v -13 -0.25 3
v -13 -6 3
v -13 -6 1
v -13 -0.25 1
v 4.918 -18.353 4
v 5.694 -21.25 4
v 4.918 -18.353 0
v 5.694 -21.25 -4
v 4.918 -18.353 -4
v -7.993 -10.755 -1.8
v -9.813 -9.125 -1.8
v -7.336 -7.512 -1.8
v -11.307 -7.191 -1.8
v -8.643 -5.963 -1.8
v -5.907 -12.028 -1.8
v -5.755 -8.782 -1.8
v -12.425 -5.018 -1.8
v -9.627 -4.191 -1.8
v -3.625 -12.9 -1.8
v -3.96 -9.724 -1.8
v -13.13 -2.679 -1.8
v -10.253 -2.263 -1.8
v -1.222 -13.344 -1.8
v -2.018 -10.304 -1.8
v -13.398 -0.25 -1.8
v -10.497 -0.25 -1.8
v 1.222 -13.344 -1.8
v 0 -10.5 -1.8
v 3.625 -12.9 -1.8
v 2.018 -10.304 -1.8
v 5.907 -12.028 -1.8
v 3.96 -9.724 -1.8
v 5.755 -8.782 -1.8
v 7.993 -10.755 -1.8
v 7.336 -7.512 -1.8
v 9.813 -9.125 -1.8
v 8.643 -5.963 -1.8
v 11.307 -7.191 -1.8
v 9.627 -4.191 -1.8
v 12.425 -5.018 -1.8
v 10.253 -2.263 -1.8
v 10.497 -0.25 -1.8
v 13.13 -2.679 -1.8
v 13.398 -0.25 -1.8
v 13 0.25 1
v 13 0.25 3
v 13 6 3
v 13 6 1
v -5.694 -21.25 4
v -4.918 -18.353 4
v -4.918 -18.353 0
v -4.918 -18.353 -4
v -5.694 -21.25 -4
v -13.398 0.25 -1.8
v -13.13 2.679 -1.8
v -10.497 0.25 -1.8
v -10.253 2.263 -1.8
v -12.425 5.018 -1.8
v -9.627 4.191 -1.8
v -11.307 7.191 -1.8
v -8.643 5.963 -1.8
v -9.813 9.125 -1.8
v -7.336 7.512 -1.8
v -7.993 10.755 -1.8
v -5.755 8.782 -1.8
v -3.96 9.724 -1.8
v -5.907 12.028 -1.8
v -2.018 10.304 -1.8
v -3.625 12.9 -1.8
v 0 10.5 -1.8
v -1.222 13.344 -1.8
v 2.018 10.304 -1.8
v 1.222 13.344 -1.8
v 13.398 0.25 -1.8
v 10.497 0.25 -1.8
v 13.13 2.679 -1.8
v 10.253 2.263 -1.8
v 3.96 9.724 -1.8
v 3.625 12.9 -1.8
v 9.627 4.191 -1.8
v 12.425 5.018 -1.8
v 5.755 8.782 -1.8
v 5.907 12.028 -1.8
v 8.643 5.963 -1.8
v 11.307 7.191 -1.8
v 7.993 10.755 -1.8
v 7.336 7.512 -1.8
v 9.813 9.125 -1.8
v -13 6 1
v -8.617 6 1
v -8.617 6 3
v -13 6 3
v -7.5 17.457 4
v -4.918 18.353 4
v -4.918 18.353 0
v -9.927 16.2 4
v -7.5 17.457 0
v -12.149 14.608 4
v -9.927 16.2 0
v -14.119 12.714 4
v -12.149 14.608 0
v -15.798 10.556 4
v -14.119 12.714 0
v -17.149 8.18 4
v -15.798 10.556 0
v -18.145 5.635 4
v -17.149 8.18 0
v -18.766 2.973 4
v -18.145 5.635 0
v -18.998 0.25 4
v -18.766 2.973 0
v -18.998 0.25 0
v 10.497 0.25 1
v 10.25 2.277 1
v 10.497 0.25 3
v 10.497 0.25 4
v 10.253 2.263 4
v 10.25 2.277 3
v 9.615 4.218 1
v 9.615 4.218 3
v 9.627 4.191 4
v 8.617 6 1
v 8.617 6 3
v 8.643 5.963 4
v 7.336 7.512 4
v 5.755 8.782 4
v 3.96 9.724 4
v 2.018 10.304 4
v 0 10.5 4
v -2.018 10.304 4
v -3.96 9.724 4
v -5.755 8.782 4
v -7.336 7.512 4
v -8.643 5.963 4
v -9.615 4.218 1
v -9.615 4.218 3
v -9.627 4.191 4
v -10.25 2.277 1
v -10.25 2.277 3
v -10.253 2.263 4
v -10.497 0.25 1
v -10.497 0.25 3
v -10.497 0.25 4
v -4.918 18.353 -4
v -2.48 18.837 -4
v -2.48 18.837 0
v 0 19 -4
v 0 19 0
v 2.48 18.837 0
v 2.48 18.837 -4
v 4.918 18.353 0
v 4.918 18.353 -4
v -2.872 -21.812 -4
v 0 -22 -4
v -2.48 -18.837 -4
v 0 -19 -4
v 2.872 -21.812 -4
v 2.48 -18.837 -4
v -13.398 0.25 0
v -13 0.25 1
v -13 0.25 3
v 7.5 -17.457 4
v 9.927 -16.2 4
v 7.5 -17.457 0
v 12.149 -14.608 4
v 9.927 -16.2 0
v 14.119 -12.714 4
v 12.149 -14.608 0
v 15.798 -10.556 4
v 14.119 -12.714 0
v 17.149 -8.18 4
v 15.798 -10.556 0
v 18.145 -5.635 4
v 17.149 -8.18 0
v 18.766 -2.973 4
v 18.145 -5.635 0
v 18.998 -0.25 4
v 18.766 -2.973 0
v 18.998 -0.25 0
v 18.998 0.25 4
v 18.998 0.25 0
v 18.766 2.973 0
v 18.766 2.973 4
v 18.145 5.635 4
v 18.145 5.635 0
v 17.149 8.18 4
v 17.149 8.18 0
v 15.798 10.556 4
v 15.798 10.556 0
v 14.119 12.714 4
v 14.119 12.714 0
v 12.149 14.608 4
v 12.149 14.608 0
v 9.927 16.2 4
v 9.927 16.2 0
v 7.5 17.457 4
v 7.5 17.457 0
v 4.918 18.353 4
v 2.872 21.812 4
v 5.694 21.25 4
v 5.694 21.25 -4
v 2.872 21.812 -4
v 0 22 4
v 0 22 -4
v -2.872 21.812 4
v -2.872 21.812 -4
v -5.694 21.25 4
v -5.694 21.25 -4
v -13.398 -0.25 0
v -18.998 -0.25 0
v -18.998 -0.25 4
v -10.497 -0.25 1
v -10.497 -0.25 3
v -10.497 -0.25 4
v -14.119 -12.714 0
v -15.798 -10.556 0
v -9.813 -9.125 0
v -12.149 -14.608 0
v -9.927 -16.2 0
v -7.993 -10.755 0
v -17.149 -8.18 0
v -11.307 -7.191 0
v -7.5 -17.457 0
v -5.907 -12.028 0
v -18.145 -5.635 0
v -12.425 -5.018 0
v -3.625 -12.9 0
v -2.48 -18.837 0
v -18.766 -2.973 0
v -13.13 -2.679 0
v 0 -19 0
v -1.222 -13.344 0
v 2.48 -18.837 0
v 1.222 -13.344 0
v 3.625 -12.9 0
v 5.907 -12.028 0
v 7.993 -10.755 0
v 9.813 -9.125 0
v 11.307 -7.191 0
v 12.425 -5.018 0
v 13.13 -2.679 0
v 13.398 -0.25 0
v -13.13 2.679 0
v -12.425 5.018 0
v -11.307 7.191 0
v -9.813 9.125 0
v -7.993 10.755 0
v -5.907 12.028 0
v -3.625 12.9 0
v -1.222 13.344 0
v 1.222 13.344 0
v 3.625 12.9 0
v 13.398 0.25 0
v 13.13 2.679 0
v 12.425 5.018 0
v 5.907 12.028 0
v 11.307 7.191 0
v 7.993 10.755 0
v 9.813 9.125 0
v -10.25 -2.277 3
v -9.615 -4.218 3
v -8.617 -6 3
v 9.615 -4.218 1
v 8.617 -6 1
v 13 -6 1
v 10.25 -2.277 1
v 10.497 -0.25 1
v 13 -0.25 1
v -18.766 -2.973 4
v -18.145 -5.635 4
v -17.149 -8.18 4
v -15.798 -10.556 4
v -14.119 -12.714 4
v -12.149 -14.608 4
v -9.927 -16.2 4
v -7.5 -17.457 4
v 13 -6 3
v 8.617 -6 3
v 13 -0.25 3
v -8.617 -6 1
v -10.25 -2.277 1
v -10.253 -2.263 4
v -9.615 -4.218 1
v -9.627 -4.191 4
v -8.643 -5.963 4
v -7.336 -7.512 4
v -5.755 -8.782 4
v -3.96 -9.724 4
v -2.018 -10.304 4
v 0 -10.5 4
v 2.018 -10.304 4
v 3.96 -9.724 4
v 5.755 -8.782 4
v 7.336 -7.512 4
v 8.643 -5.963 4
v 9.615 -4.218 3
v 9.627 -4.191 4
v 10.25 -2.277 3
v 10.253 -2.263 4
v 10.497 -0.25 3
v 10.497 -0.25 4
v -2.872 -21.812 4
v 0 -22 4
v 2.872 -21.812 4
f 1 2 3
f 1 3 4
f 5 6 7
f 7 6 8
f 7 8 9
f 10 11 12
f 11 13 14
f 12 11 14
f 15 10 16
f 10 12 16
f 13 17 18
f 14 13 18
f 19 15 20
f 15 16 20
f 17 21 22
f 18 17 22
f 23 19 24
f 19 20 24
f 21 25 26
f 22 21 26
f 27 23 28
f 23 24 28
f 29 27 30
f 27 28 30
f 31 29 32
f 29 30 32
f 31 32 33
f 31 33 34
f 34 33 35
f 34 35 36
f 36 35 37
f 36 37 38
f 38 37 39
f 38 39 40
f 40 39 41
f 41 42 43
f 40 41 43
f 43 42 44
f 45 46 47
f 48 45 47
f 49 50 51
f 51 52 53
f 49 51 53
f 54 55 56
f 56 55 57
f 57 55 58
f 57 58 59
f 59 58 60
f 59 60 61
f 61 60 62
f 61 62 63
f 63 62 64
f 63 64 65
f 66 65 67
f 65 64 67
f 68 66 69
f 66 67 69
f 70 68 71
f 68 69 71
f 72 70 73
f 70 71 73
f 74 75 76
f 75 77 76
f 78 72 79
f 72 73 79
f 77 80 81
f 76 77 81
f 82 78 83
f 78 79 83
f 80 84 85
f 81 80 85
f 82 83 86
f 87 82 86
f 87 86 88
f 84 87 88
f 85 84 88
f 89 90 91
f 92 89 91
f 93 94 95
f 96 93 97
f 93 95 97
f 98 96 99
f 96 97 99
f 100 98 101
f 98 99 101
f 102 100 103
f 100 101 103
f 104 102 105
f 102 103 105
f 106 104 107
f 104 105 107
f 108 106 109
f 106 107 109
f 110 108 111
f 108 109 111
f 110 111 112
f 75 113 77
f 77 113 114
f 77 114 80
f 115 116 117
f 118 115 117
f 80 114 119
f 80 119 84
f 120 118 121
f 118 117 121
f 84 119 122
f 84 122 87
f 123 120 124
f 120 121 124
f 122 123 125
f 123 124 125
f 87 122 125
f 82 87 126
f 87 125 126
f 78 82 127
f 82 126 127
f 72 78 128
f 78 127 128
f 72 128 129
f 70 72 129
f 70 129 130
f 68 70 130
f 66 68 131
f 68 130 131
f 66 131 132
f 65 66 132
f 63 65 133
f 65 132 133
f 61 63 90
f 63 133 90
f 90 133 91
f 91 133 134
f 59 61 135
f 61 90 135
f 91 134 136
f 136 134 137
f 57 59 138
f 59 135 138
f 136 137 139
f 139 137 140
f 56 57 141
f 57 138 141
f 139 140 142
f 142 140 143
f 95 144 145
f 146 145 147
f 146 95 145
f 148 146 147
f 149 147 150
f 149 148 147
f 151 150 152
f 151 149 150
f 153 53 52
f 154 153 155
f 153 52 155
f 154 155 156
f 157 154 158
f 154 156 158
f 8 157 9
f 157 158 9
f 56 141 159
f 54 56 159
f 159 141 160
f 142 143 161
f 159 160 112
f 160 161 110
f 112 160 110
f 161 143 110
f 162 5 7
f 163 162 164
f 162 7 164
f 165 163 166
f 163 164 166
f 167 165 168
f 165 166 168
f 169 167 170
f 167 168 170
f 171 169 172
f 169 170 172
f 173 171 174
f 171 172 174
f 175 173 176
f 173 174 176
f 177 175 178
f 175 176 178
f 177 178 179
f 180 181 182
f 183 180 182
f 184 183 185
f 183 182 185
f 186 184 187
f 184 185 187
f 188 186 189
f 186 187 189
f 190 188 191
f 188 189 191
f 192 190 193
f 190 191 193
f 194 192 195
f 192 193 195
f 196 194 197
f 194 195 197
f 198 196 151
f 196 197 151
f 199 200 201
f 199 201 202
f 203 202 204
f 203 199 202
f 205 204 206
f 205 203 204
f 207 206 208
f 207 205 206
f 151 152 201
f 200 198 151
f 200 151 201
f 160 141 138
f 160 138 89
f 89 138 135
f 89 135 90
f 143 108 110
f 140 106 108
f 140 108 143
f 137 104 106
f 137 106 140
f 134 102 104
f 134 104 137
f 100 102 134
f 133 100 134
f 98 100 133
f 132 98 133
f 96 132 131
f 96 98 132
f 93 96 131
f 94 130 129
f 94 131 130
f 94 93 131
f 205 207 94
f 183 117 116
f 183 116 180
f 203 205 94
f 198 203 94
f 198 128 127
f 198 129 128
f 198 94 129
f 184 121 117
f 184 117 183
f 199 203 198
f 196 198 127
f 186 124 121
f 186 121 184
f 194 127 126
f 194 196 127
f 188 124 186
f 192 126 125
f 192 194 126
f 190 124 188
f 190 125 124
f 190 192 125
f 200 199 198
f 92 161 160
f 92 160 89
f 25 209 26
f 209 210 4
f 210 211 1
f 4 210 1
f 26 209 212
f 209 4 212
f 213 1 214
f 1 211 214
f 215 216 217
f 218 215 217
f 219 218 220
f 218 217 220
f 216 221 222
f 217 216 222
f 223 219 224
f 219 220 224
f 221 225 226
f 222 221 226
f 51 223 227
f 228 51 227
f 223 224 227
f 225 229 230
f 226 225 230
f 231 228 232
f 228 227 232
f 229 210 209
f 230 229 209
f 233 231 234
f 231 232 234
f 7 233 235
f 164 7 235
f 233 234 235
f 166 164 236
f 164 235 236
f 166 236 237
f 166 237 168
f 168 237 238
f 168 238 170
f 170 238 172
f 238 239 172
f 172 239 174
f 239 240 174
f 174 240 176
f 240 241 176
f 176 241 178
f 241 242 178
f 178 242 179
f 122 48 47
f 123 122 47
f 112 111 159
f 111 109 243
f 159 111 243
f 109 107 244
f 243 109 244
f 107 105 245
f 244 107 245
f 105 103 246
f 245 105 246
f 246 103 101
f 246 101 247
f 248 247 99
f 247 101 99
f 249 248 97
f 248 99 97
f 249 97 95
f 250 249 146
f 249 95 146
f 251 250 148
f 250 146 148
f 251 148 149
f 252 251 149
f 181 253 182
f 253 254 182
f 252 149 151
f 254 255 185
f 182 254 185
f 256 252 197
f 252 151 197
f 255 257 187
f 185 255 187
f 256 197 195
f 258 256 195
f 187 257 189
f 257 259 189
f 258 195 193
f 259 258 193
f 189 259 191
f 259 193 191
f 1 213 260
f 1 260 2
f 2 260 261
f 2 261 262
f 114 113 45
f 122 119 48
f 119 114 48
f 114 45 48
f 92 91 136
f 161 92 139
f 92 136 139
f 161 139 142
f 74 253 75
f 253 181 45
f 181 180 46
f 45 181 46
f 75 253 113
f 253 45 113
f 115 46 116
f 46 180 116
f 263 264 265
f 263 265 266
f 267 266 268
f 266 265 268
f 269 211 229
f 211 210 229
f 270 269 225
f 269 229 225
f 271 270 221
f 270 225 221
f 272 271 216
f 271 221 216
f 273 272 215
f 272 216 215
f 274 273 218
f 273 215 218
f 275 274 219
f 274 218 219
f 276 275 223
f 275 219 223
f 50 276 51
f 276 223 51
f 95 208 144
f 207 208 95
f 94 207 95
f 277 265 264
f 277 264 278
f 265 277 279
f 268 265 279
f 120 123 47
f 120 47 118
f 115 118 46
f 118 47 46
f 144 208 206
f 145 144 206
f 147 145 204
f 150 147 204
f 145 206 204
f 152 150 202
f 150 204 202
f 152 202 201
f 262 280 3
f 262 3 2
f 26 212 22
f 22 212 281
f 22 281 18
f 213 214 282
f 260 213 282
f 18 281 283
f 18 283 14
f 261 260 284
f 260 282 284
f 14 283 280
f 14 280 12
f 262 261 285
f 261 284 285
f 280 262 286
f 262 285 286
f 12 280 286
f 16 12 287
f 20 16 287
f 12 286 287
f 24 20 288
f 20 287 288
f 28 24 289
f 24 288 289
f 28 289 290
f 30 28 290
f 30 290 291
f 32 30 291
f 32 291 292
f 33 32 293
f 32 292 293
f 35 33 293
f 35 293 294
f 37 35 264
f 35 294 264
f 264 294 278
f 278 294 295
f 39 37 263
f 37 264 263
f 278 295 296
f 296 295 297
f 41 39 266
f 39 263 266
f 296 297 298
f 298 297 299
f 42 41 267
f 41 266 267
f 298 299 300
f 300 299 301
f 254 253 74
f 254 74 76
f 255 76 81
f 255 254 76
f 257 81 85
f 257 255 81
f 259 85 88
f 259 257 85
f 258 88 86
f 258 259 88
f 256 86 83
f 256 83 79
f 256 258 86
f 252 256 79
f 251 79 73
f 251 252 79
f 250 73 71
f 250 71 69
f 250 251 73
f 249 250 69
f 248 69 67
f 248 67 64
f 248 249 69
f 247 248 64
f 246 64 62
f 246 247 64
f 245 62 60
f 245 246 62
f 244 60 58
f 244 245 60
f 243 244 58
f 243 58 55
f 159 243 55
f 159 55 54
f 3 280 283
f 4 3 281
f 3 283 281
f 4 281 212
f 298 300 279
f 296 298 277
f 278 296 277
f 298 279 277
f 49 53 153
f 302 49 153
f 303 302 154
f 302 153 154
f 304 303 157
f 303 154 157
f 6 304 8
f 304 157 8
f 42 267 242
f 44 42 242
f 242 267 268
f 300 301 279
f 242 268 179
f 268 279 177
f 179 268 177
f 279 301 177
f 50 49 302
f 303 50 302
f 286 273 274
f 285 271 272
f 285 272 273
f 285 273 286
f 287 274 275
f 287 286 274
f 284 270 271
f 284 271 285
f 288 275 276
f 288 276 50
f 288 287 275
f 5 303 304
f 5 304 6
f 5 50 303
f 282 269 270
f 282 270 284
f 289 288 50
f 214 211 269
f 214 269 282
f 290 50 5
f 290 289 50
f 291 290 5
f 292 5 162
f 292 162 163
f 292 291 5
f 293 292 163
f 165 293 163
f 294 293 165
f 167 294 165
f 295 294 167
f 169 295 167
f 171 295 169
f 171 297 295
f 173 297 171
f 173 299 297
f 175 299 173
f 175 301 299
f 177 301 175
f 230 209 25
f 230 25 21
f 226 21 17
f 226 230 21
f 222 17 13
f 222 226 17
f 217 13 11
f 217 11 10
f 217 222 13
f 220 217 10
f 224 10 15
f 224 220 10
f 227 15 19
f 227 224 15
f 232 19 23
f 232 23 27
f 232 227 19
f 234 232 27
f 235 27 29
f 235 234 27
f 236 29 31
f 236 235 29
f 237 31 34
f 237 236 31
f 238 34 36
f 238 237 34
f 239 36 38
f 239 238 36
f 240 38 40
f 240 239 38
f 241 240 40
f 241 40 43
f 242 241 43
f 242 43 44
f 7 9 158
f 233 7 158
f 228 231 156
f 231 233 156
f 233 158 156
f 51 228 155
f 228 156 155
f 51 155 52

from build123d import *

# Parameters (mm, degrees)
F0_R     = 19
F0_R_2   = 13.4
F0_R_3   = 10.5
F1_DEPTH = 4
F2_DEPTH = 1.8
F3_W     = 6
F3_H     = 2
F4_DEPTH = 13
F5_W     = 40
F5_H     = 0.5
F6_DEPTH = 25
F8_DEPTH = 4


with BuildPart() as f1:
    # F0 (on Top) → F1 (new body)
    with BuildSketch(Plane.XY):
        Circle(F0_R)
        Circle(F0_R_2, mode=Mode.SUBTRACT)
        Circle(F0_R_2)
        Circle(F0_R_3, mode=Mode.SUBTRACT)
    extrude(amount=F1_DEPTH)

    # F0 (on Top) → F2 (join)
    with BuildSketch(Plane.XY):
        Circle(F0_R_2)
        Circle(F0_R_3, mode=Mode.SUBTRACT)
    extrude(amount=-F2_DEPTH)

    # F3 (on Right) → F4 (cut, symmetric)
    with BuildSketch(Plane.YZ):
        with Locations((-3, 2)):
            Rectangle(F3_W, F3_H)
        with Locations((3, 2)):
            Rectangle(F3_W, F3_H)
    extrude(amount=F4_DEPTH, both=True, mode=Mode.SUBTRACT)

    # F5 (on face) → F6 (cut)
    with BuildSketch(Plane.XY.offset(4)):
        with BuildLine():
            Line((-10.4970233876, 0.25), (-18.998355192, 0.25))
            ThreePointArc((-18.998355192, 0.25), (-19, 0), (-18.998355192, -0.25))
            Line((-18.998355192, -0.25), (-10.4970233876, -0.25))
            ThreePointArc((-10.4970233876, -0.25), (-10.5, 0), (-10.4970233876, 0.25))
        make_face()
        Rectangle(F5_W, F5_H)
    extrude(amount=-F6_DEPTH, mode=Mode.SUBTRACT)

    # F7 (on Top) → F8 (join, symmetric)
    with BuildSketch(Plane.XY):
        with BuildLine():
            ThreePointArc((-5.6940189923, -21.2503681784), (0, -22), (5.6940189923, -21.2503681784))
            Line((5.6940189923, -21.2503681784), (4.9175618569, -18.3525906995))
            ThreePointArc((4.9175618569, -18.3525906995), (0, -19), (-4.9175618569, -18.3525906995))
            Line((-4.9175618569, -18.3525906995), (-5.6940189923, -21.2503681784))
        make_face()
        with BuildLine():
            Line((4.9175618569, 18.3525906995), (5.6940189923, 21.2503681784))
            ThreePointArc((5.6940189923, 21.2503681784), (0, 22), (-5.6940189923, 21.2503681784))
            Line((-5.6940189923, 21.2503681784), (-4.9175618569, 18.3525906995))
            ThreePointArc((-4.9175618569, 18.3525906995), (0, 19), (4.9175618569, 18.3525906995))
        make_face()
    extrude(amount=F8_DEPTH, both=True)


solid = f1.part
